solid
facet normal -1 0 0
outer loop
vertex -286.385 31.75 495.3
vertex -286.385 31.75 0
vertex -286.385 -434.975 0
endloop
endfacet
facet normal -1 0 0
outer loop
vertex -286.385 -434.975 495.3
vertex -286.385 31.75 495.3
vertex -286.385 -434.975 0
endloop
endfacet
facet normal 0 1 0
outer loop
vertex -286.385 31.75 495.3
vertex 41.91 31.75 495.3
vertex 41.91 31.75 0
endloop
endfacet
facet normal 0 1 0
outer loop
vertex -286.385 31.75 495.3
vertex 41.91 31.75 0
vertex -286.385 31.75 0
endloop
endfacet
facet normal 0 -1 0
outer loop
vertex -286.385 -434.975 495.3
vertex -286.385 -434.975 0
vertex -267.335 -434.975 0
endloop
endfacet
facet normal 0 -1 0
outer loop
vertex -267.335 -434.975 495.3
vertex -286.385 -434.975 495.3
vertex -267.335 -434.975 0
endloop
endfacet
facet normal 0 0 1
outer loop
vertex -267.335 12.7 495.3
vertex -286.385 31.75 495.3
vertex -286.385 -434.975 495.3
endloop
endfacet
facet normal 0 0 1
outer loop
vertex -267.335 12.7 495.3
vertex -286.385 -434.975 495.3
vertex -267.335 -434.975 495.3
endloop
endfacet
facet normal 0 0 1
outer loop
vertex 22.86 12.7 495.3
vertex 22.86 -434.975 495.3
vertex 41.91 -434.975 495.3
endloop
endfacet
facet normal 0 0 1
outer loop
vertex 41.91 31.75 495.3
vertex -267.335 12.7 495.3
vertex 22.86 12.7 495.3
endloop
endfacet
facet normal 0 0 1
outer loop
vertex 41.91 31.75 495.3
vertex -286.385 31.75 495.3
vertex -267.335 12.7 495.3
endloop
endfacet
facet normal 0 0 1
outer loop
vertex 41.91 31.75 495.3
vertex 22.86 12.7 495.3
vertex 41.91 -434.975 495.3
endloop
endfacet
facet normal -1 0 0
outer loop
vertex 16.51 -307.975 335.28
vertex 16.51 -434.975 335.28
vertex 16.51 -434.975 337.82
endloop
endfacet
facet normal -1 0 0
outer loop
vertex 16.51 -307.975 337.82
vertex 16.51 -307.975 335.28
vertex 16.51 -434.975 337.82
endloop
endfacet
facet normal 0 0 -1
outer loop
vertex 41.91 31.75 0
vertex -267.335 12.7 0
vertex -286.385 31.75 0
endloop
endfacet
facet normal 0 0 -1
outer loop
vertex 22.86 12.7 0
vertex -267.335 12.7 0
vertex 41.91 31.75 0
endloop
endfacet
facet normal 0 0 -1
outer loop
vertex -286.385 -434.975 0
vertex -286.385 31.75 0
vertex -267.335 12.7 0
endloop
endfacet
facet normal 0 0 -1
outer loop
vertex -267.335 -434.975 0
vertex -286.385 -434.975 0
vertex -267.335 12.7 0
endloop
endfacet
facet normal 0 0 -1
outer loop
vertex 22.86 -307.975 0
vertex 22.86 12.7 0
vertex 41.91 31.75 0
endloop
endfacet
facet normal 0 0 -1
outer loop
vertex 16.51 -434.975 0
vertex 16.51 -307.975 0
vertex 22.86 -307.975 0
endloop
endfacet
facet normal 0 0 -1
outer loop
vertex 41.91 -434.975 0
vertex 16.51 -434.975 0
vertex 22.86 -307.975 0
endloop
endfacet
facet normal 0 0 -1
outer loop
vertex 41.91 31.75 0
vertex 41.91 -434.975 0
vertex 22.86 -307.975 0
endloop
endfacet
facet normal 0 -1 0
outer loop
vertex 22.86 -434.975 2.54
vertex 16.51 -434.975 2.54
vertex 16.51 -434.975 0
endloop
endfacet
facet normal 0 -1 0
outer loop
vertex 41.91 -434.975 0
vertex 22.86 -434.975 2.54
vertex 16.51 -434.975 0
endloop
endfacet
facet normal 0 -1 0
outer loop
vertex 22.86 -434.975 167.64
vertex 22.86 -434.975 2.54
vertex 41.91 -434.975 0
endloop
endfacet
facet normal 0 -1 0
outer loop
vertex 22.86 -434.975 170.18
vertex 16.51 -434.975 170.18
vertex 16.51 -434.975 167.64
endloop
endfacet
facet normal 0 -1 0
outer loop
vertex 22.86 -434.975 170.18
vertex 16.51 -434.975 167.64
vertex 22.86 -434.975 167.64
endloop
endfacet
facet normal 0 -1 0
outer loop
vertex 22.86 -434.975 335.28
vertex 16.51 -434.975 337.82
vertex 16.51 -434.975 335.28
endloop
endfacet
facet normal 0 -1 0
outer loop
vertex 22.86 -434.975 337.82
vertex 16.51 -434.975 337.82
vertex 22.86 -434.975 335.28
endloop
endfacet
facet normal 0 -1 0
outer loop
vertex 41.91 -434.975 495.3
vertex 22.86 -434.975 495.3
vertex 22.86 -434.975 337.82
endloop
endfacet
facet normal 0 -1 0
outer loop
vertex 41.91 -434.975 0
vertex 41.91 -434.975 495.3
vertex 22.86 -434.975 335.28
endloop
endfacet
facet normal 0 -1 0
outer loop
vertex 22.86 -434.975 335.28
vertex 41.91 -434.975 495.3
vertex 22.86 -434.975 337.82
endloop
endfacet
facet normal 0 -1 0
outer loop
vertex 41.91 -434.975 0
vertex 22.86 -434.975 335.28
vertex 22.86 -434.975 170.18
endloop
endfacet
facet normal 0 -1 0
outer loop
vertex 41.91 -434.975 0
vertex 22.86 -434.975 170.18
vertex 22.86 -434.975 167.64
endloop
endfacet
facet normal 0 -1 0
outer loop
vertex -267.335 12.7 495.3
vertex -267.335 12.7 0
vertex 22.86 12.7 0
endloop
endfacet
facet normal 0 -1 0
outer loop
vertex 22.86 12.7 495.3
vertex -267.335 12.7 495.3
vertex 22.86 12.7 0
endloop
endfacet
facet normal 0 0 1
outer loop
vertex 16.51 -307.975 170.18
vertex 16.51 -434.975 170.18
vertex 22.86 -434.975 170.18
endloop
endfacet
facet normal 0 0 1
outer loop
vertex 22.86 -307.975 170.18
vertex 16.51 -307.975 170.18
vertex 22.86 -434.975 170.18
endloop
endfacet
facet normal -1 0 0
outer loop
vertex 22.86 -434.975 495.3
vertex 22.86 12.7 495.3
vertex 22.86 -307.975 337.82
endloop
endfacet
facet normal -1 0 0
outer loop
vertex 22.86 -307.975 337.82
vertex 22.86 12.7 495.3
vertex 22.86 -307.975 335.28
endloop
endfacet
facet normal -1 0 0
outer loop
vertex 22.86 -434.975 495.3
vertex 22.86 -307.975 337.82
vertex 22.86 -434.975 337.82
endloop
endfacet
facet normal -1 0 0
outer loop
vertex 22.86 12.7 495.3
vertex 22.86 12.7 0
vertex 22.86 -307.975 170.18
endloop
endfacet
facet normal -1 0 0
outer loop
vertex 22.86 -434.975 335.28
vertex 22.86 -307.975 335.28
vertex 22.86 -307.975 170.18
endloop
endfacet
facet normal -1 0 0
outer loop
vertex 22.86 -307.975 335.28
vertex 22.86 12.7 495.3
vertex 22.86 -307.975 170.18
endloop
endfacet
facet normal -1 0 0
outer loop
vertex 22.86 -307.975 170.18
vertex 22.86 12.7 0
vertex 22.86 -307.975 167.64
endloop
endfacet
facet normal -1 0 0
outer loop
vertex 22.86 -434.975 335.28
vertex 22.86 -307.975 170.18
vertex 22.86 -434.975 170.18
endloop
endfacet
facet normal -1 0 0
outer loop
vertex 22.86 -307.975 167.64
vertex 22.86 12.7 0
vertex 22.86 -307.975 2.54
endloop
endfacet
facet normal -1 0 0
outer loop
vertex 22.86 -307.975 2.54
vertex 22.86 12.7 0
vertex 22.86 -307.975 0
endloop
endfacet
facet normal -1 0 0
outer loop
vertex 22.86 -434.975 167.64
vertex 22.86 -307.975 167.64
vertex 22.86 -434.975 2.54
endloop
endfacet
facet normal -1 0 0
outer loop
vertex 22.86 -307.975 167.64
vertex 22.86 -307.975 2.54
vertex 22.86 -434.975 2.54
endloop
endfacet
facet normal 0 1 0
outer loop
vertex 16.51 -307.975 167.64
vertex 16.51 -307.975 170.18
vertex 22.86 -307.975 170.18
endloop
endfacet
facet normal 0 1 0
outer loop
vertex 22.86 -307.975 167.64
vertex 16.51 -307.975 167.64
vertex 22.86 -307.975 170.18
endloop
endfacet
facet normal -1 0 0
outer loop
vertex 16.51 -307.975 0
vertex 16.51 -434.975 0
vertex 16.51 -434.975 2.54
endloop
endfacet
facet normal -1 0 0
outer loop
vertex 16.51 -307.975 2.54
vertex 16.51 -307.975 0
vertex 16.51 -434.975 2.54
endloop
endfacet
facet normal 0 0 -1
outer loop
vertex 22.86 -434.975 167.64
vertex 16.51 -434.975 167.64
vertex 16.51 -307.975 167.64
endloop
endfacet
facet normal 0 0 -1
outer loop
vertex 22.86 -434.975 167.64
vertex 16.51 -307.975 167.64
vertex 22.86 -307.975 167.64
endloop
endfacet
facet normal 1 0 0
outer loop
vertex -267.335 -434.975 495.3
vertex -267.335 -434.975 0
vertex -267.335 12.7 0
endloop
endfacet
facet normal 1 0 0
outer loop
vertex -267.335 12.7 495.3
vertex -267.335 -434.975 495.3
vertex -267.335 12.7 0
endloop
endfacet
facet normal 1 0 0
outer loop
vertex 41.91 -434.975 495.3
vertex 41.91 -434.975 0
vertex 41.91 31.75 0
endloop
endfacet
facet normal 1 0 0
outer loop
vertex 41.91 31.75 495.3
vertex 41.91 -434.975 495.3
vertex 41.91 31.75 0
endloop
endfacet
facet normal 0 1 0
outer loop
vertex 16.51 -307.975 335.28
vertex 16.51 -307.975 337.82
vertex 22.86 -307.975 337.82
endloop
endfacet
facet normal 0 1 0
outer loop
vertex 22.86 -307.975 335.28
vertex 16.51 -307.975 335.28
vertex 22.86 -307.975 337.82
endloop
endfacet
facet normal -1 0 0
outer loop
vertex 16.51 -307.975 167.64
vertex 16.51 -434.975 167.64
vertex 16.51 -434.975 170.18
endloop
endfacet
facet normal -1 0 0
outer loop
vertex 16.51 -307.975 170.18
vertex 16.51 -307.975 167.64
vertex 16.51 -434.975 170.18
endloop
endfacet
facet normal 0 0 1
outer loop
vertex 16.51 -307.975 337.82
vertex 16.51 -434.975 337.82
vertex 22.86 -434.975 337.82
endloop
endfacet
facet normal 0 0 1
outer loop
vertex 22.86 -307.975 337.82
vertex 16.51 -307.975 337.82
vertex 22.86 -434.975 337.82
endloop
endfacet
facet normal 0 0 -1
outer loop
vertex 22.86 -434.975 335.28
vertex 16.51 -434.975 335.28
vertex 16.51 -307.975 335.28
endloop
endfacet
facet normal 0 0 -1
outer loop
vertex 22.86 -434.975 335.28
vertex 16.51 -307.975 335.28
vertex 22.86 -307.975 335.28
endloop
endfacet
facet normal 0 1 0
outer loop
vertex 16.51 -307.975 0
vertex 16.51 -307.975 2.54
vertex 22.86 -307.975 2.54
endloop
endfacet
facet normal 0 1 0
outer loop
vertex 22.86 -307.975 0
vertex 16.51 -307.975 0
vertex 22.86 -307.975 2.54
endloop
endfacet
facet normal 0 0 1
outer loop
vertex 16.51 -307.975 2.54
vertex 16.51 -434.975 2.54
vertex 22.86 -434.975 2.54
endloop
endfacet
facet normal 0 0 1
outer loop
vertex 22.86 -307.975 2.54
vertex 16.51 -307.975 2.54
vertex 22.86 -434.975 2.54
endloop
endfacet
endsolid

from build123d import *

# Parameters (mm, degrees)
F1_DEPTH = 495.3
F2_W     = 6.35
F2_H     = 2.54
F3_DEPTH = 127


with BuildPart() as f1:
    # F0 (on Top) → F1 (new body)
    with BuildSketch(Plane.XY):
        Polygon((-257.175, 12.7), (12.7, 12.7), (22.86, 12.7), (22.86, -434.975), (41.91, -434.975), (41.91, 31.75), (-286.385, 31.75), (-286.385, -434.975), (-267.335, -434.975), (-267.335, 12.7), align=None)
    extrude(amount=F1_DEPTH)

    # F2 (on face) → F3 (join)
    with BuildSketch(Plane.XZ.offset(434.975)):
        with Locations((19.685, 1.27)):
            Rectangle(F2_W, F2_H)
        with Locations((19.685, 168.91)):
            Rectangle(F2_W, F2_H)
        with Locations((19.685, 336.55)):
            Rectangle(F2_W, F2_H)
    extrude(amount=-F3_DEPTH)


solid = f1.part
